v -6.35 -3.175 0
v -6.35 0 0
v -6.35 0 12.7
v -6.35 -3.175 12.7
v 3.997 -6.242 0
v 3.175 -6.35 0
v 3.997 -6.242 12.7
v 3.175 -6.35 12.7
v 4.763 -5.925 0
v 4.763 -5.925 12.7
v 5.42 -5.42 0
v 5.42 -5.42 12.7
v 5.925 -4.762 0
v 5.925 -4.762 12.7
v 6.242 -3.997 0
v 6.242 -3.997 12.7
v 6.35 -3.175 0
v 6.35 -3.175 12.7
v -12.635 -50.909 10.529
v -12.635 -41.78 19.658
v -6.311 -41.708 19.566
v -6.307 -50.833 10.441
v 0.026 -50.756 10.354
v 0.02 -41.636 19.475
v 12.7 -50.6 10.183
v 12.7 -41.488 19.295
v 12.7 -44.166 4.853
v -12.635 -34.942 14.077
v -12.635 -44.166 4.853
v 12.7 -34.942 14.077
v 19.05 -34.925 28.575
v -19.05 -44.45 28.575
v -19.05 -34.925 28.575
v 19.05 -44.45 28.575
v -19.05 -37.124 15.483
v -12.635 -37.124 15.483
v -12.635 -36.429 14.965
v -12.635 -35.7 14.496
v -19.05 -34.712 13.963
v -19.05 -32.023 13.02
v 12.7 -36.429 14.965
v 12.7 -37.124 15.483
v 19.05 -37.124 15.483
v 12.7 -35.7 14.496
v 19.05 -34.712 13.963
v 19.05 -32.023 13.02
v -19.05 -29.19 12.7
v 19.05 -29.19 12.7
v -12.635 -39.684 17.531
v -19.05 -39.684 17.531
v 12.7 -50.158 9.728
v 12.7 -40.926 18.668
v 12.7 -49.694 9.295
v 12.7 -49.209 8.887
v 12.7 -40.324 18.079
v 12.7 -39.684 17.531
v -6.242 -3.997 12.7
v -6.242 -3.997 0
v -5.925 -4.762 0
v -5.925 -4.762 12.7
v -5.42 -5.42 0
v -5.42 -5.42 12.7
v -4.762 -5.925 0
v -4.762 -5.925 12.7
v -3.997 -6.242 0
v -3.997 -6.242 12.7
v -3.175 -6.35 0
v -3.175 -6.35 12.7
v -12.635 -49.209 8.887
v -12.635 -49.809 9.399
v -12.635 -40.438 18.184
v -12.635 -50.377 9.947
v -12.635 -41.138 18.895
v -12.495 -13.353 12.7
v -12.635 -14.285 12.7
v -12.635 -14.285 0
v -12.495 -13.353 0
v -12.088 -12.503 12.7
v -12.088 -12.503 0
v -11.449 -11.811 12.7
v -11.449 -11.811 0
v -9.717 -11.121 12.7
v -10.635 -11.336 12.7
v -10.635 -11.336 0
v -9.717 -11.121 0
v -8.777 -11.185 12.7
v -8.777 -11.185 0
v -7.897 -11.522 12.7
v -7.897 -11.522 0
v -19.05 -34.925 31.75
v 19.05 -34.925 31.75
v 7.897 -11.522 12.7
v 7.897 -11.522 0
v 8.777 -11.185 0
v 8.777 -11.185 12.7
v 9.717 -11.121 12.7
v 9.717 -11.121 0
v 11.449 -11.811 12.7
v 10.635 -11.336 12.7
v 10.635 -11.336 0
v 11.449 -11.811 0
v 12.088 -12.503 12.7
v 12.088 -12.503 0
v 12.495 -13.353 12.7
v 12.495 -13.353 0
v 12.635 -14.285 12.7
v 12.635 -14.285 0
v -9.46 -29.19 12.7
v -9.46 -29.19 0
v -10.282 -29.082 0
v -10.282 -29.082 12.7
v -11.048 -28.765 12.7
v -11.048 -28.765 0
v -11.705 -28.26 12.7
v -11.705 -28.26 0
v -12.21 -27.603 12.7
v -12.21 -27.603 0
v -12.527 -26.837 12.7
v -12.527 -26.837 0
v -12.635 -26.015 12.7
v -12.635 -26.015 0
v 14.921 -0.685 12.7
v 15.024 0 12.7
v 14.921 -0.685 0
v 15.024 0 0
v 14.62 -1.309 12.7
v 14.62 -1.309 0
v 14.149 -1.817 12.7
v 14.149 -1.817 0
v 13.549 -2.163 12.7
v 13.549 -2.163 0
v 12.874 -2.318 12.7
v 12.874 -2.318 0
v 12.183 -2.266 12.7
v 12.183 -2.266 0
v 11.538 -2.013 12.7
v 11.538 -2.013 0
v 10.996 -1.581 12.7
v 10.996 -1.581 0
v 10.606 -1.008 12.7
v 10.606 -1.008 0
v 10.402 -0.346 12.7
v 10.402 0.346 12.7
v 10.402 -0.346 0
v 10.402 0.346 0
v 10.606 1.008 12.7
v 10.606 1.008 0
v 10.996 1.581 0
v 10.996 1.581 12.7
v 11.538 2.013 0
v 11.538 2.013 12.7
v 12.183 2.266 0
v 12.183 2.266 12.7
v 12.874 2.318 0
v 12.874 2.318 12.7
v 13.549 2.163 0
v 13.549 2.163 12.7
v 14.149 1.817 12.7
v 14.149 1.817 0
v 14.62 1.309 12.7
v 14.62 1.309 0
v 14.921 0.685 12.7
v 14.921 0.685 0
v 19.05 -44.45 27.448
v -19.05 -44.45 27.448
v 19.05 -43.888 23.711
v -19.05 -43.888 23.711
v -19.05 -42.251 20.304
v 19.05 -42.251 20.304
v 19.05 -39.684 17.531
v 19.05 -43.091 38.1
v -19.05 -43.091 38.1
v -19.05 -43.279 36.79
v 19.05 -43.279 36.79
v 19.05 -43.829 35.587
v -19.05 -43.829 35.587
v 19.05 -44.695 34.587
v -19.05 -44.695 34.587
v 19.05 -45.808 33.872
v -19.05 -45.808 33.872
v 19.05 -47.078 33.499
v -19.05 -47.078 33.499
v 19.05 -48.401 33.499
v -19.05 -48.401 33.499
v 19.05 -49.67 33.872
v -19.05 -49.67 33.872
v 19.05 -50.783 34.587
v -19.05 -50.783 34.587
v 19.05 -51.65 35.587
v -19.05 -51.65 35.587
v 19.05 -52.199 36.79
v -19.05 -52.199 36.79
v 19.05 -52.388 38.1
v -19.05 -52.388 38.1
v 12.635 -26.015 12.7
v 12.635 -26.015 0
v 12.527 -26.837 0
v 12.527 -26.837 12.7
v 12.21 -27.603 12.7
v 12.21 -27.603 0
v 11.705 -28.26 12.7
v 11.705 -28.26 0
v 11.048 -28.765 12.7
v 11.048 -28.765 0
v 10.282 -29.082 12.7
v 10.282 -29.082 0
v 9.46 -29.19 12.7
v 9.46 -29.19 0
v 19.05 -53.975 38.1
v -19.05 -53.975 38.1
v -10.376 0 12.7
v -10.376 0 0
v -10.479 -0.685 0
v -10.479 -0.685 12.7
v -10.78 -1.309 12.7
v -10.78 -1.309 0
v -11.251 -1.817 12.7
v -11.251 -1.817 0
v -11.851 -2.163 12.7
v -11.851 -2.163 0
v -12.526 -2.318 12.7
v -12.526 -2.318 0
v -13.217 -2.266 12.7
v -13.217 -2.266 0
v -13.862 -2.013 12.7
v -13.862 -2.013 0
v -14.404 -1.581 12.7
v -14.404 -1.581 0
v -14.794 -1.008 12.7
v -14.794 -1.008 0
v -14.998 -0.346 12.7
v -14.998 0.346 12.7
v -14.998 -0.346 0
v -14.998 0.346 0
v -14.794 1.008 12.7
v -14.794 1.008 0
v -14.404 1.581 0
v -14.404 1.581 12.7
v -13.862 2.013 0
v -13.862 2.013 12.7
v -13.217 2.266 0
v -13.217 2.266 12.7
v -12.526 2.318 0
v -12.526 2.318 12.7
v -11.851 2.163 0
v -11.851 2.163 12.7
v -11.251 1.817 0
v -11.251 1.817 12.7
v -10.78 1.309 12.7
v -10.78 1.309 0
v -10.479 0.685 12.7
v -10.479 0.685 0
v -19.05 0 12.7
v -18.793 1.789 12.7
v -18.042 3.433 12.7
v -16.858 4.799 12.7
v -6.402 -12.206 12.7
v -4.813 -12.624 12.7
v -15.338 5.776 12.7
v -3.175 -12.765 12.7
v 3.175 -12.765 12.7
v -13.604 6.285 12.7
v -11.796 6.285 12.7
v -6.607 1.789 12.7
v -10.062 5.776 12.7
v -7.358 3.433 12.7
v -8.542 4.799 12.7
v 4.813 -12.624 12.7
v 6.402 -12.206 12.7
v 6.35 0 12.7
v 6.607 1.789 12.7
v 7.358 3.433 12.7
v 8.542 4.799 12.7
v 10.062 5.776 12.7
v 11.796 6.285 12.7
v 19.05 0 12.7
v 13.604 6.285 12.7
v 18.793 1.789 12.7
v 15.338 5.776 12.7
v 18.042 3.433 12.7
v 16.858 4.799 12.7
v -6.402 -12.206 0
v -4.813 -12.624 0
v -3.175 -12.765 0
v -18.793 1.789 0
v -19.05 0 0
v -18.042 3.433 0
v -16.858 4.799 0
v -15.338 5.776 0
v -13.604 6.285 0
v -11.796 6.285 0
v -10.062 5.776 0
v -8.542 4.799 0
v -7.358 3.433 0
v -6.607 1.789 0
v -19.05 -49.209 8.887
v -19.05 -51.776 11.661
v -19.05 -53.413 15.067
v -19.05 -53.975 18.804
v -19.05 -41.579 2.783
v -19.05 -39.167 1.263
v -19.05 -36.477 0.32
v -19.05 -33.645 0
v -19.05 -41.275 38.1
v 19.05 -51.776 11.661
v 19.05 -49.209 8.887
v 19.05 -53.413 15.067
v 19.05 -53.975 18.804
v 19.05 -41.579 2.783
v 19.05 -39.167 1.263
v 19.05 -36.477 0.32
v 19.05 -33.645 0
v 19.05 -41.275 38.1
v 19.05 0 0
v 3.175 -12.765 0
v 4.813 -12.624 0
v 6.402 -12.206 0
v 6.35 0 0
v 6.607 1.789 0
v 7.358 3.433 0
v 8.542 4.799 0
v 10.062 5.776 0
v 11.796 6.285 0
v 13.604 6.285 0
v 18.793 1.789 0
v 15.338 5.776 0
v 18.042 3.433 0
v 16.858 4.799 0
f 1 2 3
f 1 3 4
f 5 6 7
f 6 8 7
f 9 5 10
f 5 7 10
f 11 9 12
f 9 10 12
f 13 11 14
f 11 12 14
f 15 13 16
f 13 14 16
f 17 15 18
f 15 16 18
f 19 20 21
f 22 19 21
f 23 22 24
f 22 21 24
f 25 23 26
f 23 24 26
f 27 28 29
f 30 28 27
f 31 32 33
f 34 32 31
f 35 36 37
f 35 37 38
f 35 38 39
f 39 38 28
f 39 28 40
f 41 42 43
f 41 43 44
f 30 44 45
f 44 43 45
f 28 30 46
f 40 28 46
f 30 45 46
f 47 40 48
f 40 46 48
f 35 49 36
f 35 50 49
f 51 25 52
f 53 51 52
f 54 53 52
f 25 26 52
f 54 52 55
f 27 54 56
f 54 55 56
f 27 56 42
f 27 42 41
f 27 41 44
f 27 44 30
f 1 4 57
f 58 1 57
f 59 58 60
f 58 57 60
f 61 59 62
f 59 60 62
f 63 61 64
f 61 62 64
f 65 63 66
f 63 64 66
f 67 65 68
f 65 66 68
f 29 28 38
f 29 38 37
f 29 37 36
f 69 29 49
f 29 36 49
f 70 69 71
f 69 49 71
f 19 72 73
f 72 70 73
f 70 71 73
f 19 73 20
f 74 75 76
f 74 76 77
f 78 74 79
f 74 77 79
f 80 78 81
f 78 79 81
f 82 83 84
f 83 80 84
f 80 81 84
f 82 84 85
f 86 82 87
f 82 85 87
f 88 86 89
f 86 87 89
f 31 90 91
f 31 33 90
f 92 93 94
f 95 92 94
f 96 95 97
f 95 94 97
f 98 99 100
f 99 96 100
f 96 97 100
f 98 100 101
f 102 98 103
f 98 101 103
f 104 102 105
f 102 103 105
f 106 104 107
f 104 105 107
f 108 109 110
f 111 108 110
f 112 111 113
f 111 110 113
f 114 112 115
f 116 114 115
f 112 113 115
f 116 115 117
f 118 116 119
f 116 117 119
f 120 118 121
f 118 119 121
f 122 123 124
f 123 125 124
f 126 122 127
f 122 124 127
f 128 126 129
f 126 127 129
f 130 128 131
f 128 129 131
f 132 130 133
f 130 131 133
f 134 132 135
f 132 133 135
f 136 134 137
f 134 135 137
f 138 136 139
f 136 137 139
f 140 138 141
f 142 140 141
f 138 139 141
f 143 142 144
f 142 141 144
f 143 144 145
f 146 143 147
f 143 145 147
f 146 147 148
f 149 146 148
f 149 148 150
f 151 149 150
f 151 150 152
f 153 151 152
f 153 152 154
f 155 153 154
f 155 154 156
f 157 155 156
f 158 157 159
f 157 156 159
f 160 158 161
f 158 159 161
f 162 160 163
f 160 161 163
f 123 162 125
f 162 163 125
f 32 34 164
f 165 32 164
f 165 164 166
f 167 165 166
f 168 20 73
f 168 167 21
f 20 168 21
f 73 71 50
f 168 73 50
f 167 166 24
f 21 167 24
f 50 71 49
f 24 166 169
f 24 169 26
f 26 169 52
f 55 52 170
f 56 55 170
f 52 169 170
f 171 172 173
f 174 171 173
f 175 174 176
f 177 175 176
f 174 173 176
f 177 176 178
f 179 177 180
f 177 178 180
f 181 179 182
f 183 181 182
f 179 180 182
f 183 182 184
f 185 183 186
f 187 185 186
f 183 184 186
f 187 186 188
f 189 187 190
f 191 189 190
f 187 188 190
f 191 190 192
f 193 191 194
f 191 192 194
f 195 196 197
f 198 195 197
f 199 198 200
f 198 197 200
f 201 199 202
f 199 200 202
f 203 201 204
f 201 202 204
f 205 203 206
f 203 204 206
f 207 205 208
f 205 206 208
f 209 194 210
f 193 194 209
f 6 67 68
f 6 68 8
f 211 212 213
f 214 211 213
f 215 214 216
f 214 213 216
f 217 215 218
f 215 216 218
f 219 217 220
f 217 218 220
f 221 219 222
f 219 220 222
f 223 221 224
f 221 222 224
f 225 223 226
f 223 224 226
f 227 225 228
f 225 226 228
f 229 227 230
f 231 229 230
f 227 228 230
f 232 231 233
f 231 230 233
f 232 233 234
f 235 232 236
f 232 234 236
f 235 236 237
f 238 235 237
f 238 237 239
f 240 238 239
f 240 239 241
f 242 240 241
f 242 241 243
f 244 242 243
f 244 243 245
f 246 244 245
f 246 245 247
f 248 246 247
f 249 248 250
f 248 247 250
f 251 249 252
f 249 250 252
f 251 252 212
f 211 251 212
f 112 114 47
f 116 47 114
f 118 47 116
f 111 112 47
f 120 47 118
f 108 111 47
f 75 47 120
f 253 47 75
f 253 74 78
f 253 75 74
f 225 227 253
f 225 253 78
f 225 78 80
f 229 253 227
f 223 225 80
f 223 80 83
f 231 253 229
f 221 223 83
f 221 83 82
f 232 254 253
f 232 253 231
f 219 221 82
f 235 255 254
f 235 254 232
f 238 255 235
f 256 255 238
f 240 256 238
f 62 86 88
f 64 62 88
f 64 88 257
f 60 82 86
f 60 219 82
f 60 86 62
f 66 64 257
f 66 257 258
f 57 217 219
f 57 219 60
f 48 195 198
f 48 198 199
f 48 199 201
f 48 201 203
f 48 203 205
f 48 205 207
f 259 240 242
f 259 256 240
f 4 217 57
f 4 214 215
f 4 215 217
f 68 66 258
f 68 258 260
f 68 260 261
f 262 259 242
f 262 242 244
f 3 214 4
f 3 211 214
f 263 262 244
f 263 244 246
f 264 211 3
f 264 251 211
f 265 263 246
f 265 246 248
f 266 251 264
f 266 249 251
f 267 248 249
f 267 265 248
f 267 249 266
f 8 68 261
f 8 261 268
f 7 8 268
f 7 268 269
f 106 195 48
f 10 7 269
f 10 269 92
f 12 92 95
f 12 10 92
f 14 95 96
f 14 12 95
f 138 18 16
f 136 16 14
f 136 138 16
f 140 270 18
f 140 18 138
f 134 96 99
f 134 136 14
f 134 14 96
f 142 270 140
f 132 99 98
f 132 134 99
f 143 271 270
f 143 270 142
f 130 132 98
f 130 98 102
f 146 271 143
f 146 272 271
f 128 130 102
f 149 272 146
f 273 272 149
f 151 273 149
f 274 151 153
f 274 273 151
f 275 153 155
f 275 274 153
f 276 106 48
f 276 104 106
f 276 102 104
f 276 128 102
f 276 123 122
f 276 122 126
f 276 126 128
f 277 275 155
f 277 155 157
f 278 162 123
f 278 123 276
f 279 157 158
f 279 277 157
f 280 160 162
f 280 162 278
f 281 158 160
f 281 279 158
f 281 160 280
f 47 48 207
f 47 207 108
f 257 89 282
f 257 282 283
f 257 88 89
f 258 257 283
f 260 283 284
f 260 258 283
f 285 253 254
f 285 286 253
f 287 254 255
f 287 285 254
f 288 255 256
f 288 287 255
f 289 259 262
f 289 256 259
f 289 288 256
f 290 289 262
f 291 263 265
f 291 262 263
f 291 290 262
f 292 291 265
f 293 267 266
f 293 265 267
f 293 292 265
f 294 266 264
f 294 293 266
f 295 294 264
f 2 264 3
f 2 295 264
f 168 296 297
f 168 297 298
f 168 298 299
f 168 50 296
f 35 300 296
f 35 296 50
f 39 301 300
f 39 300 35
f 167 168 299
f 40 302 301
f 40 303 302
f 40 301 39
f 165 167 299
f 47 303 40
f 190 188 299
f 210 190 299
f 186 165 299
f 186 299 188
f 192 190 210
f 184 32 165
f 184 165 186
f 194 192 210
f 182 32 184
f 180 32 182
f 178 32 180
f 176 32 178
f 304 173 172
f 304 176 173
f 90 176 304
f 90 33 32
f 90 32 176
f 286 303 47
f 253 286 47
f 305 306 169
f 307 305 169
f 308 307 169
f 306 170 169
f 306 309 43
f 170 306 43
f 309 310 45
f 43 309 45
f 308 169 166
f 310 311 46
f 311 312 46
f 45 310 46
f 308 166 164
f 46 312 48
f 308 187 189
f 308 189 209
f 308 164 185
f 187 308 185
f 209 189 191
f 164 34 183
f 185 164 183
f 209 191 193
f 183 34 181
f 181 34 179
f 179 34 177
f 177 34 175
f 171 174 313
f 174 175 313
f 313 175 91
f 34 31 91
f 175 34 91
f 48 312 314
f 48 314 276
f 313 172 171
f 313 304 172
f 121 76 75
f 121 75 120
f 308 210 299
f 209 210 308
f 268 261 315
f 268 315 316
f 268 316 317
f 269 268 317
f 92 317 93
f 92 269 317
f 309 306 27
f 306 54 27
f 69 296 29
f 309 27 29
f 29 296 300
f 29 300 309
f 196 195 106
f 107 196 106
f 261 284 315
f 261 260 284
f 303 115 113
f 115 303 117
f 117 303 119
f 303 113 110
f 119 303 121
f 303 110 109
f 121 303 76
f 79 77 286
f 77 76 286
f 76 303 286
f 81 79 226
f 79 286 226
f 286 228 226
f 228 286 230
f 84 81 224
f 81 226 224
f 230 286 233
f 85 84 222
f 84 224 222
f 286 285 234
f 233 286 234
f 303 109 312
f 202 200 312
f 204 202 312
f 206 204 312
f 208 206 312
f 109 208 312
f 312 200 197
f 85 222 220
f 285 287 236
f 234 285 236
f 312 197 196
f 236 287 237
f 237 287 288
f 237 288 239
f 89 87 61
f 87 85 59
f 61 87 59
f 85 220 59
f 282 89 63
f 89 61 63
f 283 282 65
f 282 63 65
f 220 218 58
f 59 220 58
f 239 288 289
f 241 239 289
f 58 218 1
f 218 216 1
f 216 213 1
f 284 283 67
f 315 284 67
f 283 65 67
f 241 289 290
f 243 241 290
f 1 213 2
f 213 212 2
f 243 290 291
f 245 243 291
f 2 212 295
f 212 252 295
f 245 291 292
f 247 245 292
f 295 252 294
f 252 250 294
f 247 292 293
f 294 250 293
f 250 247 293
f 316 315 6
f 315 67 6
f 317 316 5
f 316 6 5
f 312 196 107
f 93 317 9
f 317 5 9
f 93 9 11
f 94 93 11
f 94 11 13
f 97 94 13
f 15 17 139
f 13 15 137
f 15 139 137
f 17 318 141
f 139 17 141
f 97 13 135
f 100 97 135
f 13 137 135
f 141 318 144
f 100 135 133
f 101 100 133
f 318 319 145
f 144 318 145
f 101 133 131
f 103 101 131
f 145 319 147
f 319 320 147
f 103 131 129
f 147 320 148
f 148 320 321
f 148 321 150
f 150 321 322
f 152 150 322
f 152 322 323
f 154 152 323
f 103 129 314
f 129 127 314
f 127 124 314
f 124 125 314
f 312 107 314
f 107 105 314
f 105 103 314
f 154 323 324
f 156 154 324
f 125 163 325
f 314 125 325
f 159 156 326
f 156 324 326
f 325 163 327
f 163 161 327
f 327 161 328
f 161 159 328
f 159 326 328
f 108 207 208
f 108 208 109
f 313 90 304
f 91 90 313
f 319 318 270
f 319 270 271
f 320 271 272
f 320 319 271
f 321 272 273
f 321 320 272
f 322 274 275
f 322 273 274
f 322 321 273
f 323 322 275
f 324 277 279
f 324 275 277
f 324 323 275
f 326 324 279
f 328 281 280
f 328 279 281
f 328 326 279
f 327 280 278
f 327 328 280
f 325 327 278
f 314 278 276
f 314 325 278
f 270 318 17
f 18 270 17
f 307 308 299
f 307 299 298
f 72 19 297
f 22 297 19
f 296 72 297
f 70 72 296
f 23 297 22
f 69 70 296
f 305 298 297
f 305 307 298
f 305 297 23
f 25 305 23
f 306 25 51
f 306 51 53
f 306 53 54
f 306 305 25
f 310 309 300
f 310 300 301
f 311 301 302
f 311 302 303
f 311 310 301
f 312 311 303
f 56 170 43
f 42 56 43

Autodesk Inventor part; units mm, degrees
ref_plane "YZ Plane" through (0, 0, 0) normal (1, 0, 0) x (0, 1, 0)
ref_plane "XZ Plane" through (0, 0, 0) normal (0, 1, 0) x (-1, 0, 0)
ref_plane "XY Plane" through (0, 0, 0) normal (0, 0, 1) x (1, 0, 0)
sketch "Sketch1" plane through (0, 0, 0) normal (0, 0, 1) x (1, 0, 0)
  line L0 (0, 0) -> (12.7, 0)
  line L1 (0, 0) -> (-12.7, 0)
  circle A0 centre (-12.7, 0) radius 2.3241
  circle A1 centre (12.7, 0) radius 2.3241
  line L2 (-12.7, 0) -> (-6.35, 0)
  circle A2 centre (-12.7, 0) radius 6.35
  circle A3 centre (12.7, 0) radius 6.35
  line L3 (-12.7, -6.35) -> (-10.8231, -6.35)
  line L4 (-10.8231, -6.35) -> (12.7, -6.35)
  line L5 (-19.05, 0) -> (19.05, 0)
  line L6 (19.05, 0) -> (19.05, -50.8)
  line L7 (19.05, -50.8) -> (-19.05, -50.8)
  line L8 (-19.05, -50.8) -> (-19.05, 0)
  line L9 (-6.35, 0) -> (-6.35, -6.35)
  line L10 (6.35, 0) -> (6.35, -6.35)
  dimension "d0" = 12.7
  dimension "d1" = 12.7
  dimension "d2" = 4.6482
  dimension "d3" = 4.6482
  dimension "d5" = 12.7
  dimension "d6" = 50.8
extrude "Extrusion1" add sketch "Sketch1" along normal blind 12.7 contours A3 L5 A1 L0 | L0 A1 L5 A3 | A3 L4 L10 | A2 L5 A0 L1 | L1 A0 L5 A2 | L9 L4 L3 A2 | L6 L7 L8 A2 L3 L4 A3
fillet "Fillet1" radius 3.175 2 edges at (6.35, -6.35, 6.35) (-6.35, -6.35, 6.35)
sketch "Sketch2" plane through (-19.05, -50.8, 0) normal (-1, 0, 0) x (0, 0, 1)
  line L0 (12.7, 50.8) -> (12.7, 0) projected
  line L1 (0, 0) -> (12.7, 0) projected
  line L2 (12.7, 0) -> (38.1, 0)
  line L3 (38.1, 0) -> (38.1, 6.35)
  line L4 (38.1, 6.35) -> (12.7, 6.35)
  point P0 (0, 50.8)
  dimension "d10" = 25.4
  dimension "d11" = 6.35
extrude "Extrusion2" add sketch "Sketch2" against normal up to surface (38.1 mm away)
sketch "Sketch3" plane through (-19.05, -44.45, 38.1) normal (0, 1, 0) x (1, 0, 0)
  line L0 (38.1, 0) -> (38.1, 25.4) projected
  line L1 (0, 25.4) -> (38.1, 25.4) projected
  line L2 (0, 0) -> (0, 25.4) projected
  line L3 (0, 0) -> (38.1, 0) projected
  line L4 (38.1, 0) -> (0, 0)
  line L5 (0, 0) -> (0, 9.525)
  line L6 (0, 9.525) -> (38.1, 9.525)
  line L7 (38.1, 9.525) -> (38.1, 0)
  point P0 (19.05, 38.1)
  dimension "d14" = 9.525
extrude "Extrusion3" add sketch "Sketch3" along normal blind 9.525 contours L3 L2 L6 L0
sketch "Sketch4" plane through (-19.05, -50.8, 0) normal (0, -1, 0) x (1, 0, 0)
  line L0 (0, 0) -> (38.1, 0) projected
  line L1 (38.1, 0) -> (38.1, 38.1) projected
  line L2 (0, 38.1) -> (38.1, 38.1) projected
  line L3 (0, 0) -> (0, 38.1) projected
  point P0 (19.05, 0)
extrude "Extrusion4" add sketch "Sketch4" along normal blind 3.175
chamfer "Chamfer1" distance 6.35 angle 45 1 edges at (0, -34.925, 38.1)
sketch "Sketch5" plane through (-19.05, 0, 0) normal (-1, 0, 0) x (0, 0, 1)
  line L0 (38.1, -53.975) -> (0, -53.975) projected
  line L1 (38.1, -53.975) -> (38.1, -52.3875)
  line L2 (38.1, -53.975) -> (38.1, -41.275) projected
  line L3 (38.1, -52.3875) -> (38.1, -47.7393)
  circle A0 centre (38.1, -47.7393) radius 4.6482
  point P0 (0, 0)
  point P1 (38.1, -43.0911)
  dimension "d22" = 1.5875
  dimension "d23" = 4.6482
extrude "Extrusion5" cut sketch "Sketch5" against normal through all contours A0 L2 picked at (35.7974, -45.6994)
sketch "Sketch6" plane through (-19.05, 0, 0) normal (-1, 0, 0) x (0, 0, 1)
  arc A0 (38.1, -43.0911) -> (38.1, -52.3875) centre (38.1, -47.7393) ccw projected
  line L0 (38.1, -43.0911) -> (38.1, -41.275) projected
  line L1 (31.75, -34.925) -> (38.1, -41.275) projected
  line L2 (28.575, -34.925) -> (31.75, -34.925) projected
  line L3 (28.575, -44.45) -> (28.575, -34.925) projected
  line L4 (28.575, -44.45) -> (12.7, -44.45) projected
  line L5 (12.7, 0) -> (12.7, -44.45) projected
  line L6 (0, 0) -> (12.7, 0) projected
  line L7 (0, 0) -> (0, -53.975) projected
  line L8 (38.1, -53.975) -> (0, -53.975) projected
  line L9 (38.1, -53.975) -> (38.1, -52.3875) projected
  line L10 (12.7, -53.975) -> (0, -38.1)
  line L11 (22.617, -46.0414) -> (9.917, -30.1664)
  point P0 (0, 0)
  point P1 (21.3439, -44.45)
  point P2 (12.7, -33.6451)
  dimension "d26" = 12.7
extrude "Extrusion6" cut sketch "Sketch6" against normal through all contours L8 L7 L10
extrude "Extrusion7" add sketch "Sketch6" against normal up to surface (38.1 mm away) contours L4 L5 L11
fillet "Fillet2" radius 12.7 4 edges at (0, -38.1, 0) (0, -53.975, 12.7) (0, -33.6451, 12.7) (0, -44.45, 21.3439)
sketch "Sketch7" plane through (0, 0, 12.7) normal (0, 0, 1) x (1, 0, 0)
  line L0 (19.05, -29.1902) -> (-19.05, -29.1902) projected
  line L1 (19.05, -29.1902) -> (19.05, 0) projected
  arc A0 (19.05, 0) -> (6.35, 0) centre (12.7, 0) ccw projected
  line L2 (6.35, 0) -> (6.35, -3.175) projected
  arc A1 (3.175, -6.35) -> (6.35, -3.175) centre (3.175, -3.175) ccw projected
  line L3 (3.175, -6.35) -> (-3.175, -6.35) projected
  arc A2 (-6.35, -3.175) -> (-3.175, -6.35) centre (-3.175, -3.175) ccw projected
  line L4 (-6.35, -3.175) -> (-6.35, 0) projected
  arc A3 (-6.35, 0) -> (-19.05, 0) centre (-12.7, 0) ccw projected
  line L5 (-19.05, 0) -> (-19.05, -29.1902) projected
  circle A4 centre (-12.7, 0) radius 2.3241 projected
  circle A5 centre (12.7, 0) radius 2.3241 projected
  line L6 (-3.175, -12.7649) -> (3.175, -12.7649)
  arc A6 (3.175, -12.7649) -> (12.6351, -4.7474) centre (3.175, -3.175) ccw
  line L7 (12.6351, -4.7474) -> (12.6351, -22.7753)
  line L8 (12.6351, -22.7753) -> (-12.6351, -22.7753)
  line L9 (-12.6351, -22.7753) -> (-12.6351, -4.7474)
  arc A7 (-12.6351, -4.7474) -> (-3.175, -12.7649) centre (-3.175, -3.175) ccw
  line L10 (-12.6351, -22.7753) -> (-12.6351, -29.1902)
  line L11 (12.6351, -29.1902) -> (12.6351, -22.7753)
  line L12 (12.6351, -29.1902) -> (-12.6351, -29.1902)
  point P0 (0, 0)
extrude "Extrusion8" cut sketch "Sketch7" against normal through all contours L0 L10 L8 L11 | L8 L9 A7 L6 A6 L7
fillet "Fillet3" radius 3.175 2 edges at (-12.6351, -4.7474, 6.35) (12.6351, -4.7474, 6.35)
fillet "Fillet4" radius 3.175 2 edges at (12.6351, -29.1902, 6.35) (-12.6351, -29.1902, 6.35)
sketch "Sketch8" plane through (-19.05, -34.925, 31.75) normal (0, 0.7071, 0.7071) x (1, 0, 0)
  ellipse E0 centre (31.75, 38.1661) end of major axis (29.4259, 38.1661) minor radius 1.6434 projected
  ellipse E1 centre (6.35, 38.1661) end of major axis (4.0259, 38.1661) minor radius 1.6434 projected
  line L0 (6.4149, 19.7706) -> (6.4149, 28.0648) projected
  ellipse E2 centre (9.5899, 28.0648) end of major axis (6.4149, 28.0648) minor radius 2.2451 (11.1532, 30.0189) -> (6.4149, 28.0648) ccw projected
  ellipse E3 centre (15.875, 35.921) end of major axis (25.4649, 35.921) minor radius 6.7811 (11.1532, 30.0189) -> (15.875, 29.1399) ccw projected
  line L1 (15.875, 29.1399) -> (22.225, 29.1399) projected
  ellipse E4 centre (22.225, 35.921) end of major axis (12.6351, 35.921) minor radius 6.7811 (22.225, 29.1399) -> (26.9468, 30.0189) ccw projected
  ellipse E5 centre (28.5101, 28.0648) end of major axis (25.3351, 28.0648) minor radius 2.2451 (31.6851, 28.0648) -> (26.9468, 30.0189) ccw projected
  line L2 (31.6851, 28.0648) -> (31.6851, 19.7706) projected
  ellipse E6 centre (28.5101, 19.7706) end of major axis (31.6851, 19.7706) minor radius 2.2451 (28.5101, 17.5255) -> (31.6851, 19.7706) ccw projected
  line L3 (38.1, 17.5255) -> (28.5101, 17.5255) projected
  line L4 (38.1, 17.5255) -> (38.1, 38.1661) projected
  ellipse E7 centre (31.75, 38.1661) end of major axis (38.1, 38.1661) minor radius 4.4901 (38.1, 38.1661) -> (25.4, 38.1661) ccw projected
  line L5 (25.4, 38.1661) -> (25.4, 35.921) projected
  ellipse E8 centre (22.225, 35.921) end of major axis (25.4, 35.921) minor radius 2.2451 (22.225, 33.676) -> (25.4, 35.921) ccw projected
  line L6 (22.225, 33.676) -> (15.875, 33.676) projected
  ellipse E9 centre (15.875, 35.921) end of major axis (19.05, 35.921) minor radius 2.2451 (12.7, 35.921) -> (15.875, 33.676) ccw projected
  line L7 (12.7, 35.921) -> (12.7, 38.1661) projected
  ellipse E10 centre (6.35, 38.1661) end of major axis (12.7, 38.1661) minor radius 4.4901 (12.7, 38.1661) -> (0, 38.1661) ccw projected
  line L8 (0, 38.1661) -> (0, 17.5255) projected
  line L9 (9.5899, 17.5255) -> (0, 17.5255) projected
  ellipse E11 centre (9.5899, 19.7706) end of major axis (12.7649, 19.7706) minor radius 2.2451 (6.4149, 19.7706) -> (9.5899, 17.5255) ccw projected
  line L10 (6.4149, 17.5255) -> (6.4149, 3.7029)
  line L11 (6.4149, 3.7029) -> (31.75, 4.1664)
  line L12 (31.75, 4.1664) -> (31.75, 17.5255)
  line L13 (6.4149, 17.5255) -> (31.75, 17.5255)
  line L14 (6.4149, 17.5255) -> (6.4149, 12.4851)
  line L15 (6.4149, 12.4851) -> (31.75, 12.4851)
  point P0 (19.05, 47.1463)
extrude "Extrusion9" cut sketch "Sketch8" against normal through all contours L15 L12 L11 L10
properties part number "Rear Jaw"
